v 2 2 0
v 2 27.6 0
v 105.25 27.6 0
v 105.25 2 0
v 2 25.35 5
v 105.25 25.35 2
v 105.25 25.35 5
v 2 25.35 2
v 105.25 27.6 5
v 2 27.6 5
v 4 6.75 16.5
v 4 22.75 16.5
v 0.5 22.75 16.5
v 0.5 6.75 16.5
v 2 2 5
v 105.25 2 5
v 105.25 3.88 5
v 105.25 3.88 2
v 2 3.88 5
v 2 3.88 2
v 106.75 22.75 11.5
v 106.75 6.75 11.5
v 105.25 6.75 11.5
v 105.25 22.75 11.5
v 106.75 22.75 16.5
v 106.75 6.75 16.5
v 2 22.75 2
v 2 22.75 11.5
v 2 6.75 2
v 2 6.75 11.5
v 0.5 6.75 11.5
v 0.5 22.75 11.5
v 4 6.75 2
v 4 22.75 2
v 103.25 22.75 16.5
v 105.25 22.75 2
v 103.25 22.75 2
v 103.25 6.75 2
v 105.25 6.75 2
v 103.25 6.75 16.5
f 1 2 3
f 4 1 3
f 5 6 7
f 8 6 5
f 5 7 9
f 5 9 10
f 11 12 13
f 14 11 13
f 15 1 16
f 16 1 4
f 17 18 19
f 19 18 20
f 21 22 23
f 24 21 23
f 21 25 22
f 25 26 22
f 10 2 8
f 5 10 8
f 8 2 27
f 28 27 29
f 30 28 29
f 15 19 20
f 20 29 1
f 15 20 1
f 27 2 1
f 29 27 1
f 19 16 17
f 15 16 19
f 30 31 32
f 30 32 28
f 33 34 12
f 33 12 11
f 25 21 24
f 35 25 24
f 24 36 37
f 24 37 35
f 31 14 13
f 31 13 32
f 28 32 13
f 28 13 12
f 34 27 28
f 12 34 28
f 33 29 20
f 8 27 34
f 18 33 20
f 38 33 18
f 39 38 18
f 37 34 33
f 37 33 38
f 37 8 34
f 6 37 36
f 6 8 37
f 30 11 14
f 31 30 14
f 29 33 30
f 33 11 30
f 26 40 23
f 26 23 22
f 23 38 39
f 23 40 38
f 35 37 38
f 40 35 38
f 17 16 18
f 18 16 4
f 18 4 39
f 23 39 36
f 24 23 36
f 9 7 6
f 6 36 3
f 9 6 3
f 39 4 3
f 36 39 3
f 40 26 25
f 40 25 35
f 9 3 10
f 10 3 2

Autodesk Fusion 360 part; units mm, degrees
sketch "Base" plane through (0, 0, 0) normal (0, 0, 1) x (1, 0, 0)
  line L0 (2, 2) -> (105.25, 2)
  line L1 (105.25, 2) -> (105.25, 27.6)
  line L2 (105.25, 27.6) -> (2, 27.6)
  line L3 (2, 27.6) -> (2, 2)
  dimension "d1" = 25.6
  dimension "d2" = 103.25
extrude "Extrude1" add sketch "Base" along normal blind 2
sketch "Rail" plane through (0, 0, 2) normal (0, 0, 1) x (-1, 0, 0)
  line L0 (-2, -27.6) -> (-2, -2)
  line L1 (-2, -2) -> (-105.25, -2)
  line L2 (-105.25, -2) -> (-105.25, -27.6)
  line L3 (-105.25, -27.6) -> (-2, -27.6)
  line L4 (-2, -27.6) -> (-105.25, -27.6)
  line L5 (-105.25, -27.6) -> (-105.25, -25.35)
  line L6 (-105.25, -25.35) -> (-2, -25.35)
  line L7 (-2, -25.35) -> (-2, -27.6)
  line L8 (-2, -2) -> (-105.25, -2)
  line L9 (-105.25, -2) -> (-105.25, -3.88)
  line L10 (-105.25, -3.88) -> (-2, -3.88)
  line L11 (-2, -3.88) -> (-2, -2)
  dimension "d5" = 2.25
  dimension "d6" = 1.88
extrude "Extrude2" add sketch "Rail" along normal blind 3 contours L0 L2 L3 L4 L5 L6 L7 | L0 L1 L2 L8 L9 L10 L11
sketch "Hook (1.5mm -> 2mm)" plane through (0, 0, 2) normal (0, 0, 1) x (-1, 0, 0)
  line L0 (-2, -3.88) -> (-105.25, -3.88)
  line L1 (-105.25, -3.88) -> (-105.25, -25.35)
  line L2 (-105.25, -25.35) -> (-2, -25.35)
  line L3 (-2, -25.35) -> (-2, -3.88)
  line L4 (-2, -22.75) -> (-4, -22.75)
  line L5 (-4, -22.75) -> (-4, -6.75)
  line L6 (-4, -6.75) -> (-2, -6.75)
  line L7 (-2, -6.75) -> (-2, -22.75)
  line L8 (-105.25, -22.75) -> (-103.25, -22.75)
  line L9 (-103.25, -22.75) -> (-103.25, -6.75)
  line L10 (-103.25, -6.75) -> (-105.25, -6.75)
  line L11 (-105.25, -6.75) -> (-105.25, -22.75)
  dimension "d9" = 2.6
  dimension "d10" = 16
  dimension "d11" = 3.07
  dimension "d12" = 2
  dimension "d13" = 2
  dimension "d14" = 16
  dimension "d15" = 2.6
  dimension "d16" = 2.87
extrude "Extrude3" add sketch "Hook (1.5mm -> 2mm)" along normal blind 14.5 contours L3 L4 L5 L6 L7 | L1 L8 L9 L10 L11
sketch "Hook Left" plane through (0, 6.75, 0) normal (0, -1, 0) x (1, 0, 0)
  line L0 (2, 2) -> (4, 2)
  line L1 (4, 2) -> (4, 16.5)
  line L2 (4, 16.5) -> (2, 16.5)
  line L3 (2, 16.5) -> (2, 2)
  line L4 (4, 16.5) -> (0.5, 16.5)
  line L5 (0.5, 16.5) -> (0.5, 11.5)
  line L6 (0.5, 11.5) -> (4, 11.5)
  line L7 (4, 11.5) -> (4, 16.5)
  dimension "d19" = 3.5
  dimension "d20" = 5
sketch "Hook Right" plane through (0, 6.75, 0) normal (0, -1, 0) x (1, 0, 0)
  line L0 (103.25, 2) -> (105.25, 2)
  line L1 (105.25, 2) -> (105.25, 16.5)
  line L2 (105.25, 16.5) -> (103.25, 16.5)
  line L3 (103.25, 16.5) -> (103.25, 2)
  line L4 (103.25, 16.5) -> (106.75, 16.5)
  line L5 (106.75, 16.5) -> (106.75, 11.5)
  line L6 (106.75, 11.5) -> (103.25, 11.5)
  line L7 (103.25, 11.5) -> (103.25, 16.5)
  dimension "d21" = 5
  dimension "d22" = 3.5
extrude "Extrude5" add sketch "Hook Left" sketch "Hook Right" against normal blind 16 contours L3 L4 L5 L6 of sketch 2 contours L1 L4 L5 L6
chamfer "Chamfer1" distance 4 distance2 1.5 1 edges at (0.5, 14.75, 16.5) measured on face at (0.5, 12.0833, 14.8333)
chamfer "Chamfer2" distance 1.5 distance2 4 1 edges at (106.75, 14.75, 16.5) measured on face at (104.4167, 12.0833, 16.5)
extrude "Extrude4" add sketch "Hook Left" sketch "Hook Right" against normal blind 16 contours L3 L4 L5 L6 of sketch 2 contours L1 L4 L5 L6
equation "d19 = 1.5 mm + 2 mm"
equation "d22 = 2 mm + 1.5 mm"
